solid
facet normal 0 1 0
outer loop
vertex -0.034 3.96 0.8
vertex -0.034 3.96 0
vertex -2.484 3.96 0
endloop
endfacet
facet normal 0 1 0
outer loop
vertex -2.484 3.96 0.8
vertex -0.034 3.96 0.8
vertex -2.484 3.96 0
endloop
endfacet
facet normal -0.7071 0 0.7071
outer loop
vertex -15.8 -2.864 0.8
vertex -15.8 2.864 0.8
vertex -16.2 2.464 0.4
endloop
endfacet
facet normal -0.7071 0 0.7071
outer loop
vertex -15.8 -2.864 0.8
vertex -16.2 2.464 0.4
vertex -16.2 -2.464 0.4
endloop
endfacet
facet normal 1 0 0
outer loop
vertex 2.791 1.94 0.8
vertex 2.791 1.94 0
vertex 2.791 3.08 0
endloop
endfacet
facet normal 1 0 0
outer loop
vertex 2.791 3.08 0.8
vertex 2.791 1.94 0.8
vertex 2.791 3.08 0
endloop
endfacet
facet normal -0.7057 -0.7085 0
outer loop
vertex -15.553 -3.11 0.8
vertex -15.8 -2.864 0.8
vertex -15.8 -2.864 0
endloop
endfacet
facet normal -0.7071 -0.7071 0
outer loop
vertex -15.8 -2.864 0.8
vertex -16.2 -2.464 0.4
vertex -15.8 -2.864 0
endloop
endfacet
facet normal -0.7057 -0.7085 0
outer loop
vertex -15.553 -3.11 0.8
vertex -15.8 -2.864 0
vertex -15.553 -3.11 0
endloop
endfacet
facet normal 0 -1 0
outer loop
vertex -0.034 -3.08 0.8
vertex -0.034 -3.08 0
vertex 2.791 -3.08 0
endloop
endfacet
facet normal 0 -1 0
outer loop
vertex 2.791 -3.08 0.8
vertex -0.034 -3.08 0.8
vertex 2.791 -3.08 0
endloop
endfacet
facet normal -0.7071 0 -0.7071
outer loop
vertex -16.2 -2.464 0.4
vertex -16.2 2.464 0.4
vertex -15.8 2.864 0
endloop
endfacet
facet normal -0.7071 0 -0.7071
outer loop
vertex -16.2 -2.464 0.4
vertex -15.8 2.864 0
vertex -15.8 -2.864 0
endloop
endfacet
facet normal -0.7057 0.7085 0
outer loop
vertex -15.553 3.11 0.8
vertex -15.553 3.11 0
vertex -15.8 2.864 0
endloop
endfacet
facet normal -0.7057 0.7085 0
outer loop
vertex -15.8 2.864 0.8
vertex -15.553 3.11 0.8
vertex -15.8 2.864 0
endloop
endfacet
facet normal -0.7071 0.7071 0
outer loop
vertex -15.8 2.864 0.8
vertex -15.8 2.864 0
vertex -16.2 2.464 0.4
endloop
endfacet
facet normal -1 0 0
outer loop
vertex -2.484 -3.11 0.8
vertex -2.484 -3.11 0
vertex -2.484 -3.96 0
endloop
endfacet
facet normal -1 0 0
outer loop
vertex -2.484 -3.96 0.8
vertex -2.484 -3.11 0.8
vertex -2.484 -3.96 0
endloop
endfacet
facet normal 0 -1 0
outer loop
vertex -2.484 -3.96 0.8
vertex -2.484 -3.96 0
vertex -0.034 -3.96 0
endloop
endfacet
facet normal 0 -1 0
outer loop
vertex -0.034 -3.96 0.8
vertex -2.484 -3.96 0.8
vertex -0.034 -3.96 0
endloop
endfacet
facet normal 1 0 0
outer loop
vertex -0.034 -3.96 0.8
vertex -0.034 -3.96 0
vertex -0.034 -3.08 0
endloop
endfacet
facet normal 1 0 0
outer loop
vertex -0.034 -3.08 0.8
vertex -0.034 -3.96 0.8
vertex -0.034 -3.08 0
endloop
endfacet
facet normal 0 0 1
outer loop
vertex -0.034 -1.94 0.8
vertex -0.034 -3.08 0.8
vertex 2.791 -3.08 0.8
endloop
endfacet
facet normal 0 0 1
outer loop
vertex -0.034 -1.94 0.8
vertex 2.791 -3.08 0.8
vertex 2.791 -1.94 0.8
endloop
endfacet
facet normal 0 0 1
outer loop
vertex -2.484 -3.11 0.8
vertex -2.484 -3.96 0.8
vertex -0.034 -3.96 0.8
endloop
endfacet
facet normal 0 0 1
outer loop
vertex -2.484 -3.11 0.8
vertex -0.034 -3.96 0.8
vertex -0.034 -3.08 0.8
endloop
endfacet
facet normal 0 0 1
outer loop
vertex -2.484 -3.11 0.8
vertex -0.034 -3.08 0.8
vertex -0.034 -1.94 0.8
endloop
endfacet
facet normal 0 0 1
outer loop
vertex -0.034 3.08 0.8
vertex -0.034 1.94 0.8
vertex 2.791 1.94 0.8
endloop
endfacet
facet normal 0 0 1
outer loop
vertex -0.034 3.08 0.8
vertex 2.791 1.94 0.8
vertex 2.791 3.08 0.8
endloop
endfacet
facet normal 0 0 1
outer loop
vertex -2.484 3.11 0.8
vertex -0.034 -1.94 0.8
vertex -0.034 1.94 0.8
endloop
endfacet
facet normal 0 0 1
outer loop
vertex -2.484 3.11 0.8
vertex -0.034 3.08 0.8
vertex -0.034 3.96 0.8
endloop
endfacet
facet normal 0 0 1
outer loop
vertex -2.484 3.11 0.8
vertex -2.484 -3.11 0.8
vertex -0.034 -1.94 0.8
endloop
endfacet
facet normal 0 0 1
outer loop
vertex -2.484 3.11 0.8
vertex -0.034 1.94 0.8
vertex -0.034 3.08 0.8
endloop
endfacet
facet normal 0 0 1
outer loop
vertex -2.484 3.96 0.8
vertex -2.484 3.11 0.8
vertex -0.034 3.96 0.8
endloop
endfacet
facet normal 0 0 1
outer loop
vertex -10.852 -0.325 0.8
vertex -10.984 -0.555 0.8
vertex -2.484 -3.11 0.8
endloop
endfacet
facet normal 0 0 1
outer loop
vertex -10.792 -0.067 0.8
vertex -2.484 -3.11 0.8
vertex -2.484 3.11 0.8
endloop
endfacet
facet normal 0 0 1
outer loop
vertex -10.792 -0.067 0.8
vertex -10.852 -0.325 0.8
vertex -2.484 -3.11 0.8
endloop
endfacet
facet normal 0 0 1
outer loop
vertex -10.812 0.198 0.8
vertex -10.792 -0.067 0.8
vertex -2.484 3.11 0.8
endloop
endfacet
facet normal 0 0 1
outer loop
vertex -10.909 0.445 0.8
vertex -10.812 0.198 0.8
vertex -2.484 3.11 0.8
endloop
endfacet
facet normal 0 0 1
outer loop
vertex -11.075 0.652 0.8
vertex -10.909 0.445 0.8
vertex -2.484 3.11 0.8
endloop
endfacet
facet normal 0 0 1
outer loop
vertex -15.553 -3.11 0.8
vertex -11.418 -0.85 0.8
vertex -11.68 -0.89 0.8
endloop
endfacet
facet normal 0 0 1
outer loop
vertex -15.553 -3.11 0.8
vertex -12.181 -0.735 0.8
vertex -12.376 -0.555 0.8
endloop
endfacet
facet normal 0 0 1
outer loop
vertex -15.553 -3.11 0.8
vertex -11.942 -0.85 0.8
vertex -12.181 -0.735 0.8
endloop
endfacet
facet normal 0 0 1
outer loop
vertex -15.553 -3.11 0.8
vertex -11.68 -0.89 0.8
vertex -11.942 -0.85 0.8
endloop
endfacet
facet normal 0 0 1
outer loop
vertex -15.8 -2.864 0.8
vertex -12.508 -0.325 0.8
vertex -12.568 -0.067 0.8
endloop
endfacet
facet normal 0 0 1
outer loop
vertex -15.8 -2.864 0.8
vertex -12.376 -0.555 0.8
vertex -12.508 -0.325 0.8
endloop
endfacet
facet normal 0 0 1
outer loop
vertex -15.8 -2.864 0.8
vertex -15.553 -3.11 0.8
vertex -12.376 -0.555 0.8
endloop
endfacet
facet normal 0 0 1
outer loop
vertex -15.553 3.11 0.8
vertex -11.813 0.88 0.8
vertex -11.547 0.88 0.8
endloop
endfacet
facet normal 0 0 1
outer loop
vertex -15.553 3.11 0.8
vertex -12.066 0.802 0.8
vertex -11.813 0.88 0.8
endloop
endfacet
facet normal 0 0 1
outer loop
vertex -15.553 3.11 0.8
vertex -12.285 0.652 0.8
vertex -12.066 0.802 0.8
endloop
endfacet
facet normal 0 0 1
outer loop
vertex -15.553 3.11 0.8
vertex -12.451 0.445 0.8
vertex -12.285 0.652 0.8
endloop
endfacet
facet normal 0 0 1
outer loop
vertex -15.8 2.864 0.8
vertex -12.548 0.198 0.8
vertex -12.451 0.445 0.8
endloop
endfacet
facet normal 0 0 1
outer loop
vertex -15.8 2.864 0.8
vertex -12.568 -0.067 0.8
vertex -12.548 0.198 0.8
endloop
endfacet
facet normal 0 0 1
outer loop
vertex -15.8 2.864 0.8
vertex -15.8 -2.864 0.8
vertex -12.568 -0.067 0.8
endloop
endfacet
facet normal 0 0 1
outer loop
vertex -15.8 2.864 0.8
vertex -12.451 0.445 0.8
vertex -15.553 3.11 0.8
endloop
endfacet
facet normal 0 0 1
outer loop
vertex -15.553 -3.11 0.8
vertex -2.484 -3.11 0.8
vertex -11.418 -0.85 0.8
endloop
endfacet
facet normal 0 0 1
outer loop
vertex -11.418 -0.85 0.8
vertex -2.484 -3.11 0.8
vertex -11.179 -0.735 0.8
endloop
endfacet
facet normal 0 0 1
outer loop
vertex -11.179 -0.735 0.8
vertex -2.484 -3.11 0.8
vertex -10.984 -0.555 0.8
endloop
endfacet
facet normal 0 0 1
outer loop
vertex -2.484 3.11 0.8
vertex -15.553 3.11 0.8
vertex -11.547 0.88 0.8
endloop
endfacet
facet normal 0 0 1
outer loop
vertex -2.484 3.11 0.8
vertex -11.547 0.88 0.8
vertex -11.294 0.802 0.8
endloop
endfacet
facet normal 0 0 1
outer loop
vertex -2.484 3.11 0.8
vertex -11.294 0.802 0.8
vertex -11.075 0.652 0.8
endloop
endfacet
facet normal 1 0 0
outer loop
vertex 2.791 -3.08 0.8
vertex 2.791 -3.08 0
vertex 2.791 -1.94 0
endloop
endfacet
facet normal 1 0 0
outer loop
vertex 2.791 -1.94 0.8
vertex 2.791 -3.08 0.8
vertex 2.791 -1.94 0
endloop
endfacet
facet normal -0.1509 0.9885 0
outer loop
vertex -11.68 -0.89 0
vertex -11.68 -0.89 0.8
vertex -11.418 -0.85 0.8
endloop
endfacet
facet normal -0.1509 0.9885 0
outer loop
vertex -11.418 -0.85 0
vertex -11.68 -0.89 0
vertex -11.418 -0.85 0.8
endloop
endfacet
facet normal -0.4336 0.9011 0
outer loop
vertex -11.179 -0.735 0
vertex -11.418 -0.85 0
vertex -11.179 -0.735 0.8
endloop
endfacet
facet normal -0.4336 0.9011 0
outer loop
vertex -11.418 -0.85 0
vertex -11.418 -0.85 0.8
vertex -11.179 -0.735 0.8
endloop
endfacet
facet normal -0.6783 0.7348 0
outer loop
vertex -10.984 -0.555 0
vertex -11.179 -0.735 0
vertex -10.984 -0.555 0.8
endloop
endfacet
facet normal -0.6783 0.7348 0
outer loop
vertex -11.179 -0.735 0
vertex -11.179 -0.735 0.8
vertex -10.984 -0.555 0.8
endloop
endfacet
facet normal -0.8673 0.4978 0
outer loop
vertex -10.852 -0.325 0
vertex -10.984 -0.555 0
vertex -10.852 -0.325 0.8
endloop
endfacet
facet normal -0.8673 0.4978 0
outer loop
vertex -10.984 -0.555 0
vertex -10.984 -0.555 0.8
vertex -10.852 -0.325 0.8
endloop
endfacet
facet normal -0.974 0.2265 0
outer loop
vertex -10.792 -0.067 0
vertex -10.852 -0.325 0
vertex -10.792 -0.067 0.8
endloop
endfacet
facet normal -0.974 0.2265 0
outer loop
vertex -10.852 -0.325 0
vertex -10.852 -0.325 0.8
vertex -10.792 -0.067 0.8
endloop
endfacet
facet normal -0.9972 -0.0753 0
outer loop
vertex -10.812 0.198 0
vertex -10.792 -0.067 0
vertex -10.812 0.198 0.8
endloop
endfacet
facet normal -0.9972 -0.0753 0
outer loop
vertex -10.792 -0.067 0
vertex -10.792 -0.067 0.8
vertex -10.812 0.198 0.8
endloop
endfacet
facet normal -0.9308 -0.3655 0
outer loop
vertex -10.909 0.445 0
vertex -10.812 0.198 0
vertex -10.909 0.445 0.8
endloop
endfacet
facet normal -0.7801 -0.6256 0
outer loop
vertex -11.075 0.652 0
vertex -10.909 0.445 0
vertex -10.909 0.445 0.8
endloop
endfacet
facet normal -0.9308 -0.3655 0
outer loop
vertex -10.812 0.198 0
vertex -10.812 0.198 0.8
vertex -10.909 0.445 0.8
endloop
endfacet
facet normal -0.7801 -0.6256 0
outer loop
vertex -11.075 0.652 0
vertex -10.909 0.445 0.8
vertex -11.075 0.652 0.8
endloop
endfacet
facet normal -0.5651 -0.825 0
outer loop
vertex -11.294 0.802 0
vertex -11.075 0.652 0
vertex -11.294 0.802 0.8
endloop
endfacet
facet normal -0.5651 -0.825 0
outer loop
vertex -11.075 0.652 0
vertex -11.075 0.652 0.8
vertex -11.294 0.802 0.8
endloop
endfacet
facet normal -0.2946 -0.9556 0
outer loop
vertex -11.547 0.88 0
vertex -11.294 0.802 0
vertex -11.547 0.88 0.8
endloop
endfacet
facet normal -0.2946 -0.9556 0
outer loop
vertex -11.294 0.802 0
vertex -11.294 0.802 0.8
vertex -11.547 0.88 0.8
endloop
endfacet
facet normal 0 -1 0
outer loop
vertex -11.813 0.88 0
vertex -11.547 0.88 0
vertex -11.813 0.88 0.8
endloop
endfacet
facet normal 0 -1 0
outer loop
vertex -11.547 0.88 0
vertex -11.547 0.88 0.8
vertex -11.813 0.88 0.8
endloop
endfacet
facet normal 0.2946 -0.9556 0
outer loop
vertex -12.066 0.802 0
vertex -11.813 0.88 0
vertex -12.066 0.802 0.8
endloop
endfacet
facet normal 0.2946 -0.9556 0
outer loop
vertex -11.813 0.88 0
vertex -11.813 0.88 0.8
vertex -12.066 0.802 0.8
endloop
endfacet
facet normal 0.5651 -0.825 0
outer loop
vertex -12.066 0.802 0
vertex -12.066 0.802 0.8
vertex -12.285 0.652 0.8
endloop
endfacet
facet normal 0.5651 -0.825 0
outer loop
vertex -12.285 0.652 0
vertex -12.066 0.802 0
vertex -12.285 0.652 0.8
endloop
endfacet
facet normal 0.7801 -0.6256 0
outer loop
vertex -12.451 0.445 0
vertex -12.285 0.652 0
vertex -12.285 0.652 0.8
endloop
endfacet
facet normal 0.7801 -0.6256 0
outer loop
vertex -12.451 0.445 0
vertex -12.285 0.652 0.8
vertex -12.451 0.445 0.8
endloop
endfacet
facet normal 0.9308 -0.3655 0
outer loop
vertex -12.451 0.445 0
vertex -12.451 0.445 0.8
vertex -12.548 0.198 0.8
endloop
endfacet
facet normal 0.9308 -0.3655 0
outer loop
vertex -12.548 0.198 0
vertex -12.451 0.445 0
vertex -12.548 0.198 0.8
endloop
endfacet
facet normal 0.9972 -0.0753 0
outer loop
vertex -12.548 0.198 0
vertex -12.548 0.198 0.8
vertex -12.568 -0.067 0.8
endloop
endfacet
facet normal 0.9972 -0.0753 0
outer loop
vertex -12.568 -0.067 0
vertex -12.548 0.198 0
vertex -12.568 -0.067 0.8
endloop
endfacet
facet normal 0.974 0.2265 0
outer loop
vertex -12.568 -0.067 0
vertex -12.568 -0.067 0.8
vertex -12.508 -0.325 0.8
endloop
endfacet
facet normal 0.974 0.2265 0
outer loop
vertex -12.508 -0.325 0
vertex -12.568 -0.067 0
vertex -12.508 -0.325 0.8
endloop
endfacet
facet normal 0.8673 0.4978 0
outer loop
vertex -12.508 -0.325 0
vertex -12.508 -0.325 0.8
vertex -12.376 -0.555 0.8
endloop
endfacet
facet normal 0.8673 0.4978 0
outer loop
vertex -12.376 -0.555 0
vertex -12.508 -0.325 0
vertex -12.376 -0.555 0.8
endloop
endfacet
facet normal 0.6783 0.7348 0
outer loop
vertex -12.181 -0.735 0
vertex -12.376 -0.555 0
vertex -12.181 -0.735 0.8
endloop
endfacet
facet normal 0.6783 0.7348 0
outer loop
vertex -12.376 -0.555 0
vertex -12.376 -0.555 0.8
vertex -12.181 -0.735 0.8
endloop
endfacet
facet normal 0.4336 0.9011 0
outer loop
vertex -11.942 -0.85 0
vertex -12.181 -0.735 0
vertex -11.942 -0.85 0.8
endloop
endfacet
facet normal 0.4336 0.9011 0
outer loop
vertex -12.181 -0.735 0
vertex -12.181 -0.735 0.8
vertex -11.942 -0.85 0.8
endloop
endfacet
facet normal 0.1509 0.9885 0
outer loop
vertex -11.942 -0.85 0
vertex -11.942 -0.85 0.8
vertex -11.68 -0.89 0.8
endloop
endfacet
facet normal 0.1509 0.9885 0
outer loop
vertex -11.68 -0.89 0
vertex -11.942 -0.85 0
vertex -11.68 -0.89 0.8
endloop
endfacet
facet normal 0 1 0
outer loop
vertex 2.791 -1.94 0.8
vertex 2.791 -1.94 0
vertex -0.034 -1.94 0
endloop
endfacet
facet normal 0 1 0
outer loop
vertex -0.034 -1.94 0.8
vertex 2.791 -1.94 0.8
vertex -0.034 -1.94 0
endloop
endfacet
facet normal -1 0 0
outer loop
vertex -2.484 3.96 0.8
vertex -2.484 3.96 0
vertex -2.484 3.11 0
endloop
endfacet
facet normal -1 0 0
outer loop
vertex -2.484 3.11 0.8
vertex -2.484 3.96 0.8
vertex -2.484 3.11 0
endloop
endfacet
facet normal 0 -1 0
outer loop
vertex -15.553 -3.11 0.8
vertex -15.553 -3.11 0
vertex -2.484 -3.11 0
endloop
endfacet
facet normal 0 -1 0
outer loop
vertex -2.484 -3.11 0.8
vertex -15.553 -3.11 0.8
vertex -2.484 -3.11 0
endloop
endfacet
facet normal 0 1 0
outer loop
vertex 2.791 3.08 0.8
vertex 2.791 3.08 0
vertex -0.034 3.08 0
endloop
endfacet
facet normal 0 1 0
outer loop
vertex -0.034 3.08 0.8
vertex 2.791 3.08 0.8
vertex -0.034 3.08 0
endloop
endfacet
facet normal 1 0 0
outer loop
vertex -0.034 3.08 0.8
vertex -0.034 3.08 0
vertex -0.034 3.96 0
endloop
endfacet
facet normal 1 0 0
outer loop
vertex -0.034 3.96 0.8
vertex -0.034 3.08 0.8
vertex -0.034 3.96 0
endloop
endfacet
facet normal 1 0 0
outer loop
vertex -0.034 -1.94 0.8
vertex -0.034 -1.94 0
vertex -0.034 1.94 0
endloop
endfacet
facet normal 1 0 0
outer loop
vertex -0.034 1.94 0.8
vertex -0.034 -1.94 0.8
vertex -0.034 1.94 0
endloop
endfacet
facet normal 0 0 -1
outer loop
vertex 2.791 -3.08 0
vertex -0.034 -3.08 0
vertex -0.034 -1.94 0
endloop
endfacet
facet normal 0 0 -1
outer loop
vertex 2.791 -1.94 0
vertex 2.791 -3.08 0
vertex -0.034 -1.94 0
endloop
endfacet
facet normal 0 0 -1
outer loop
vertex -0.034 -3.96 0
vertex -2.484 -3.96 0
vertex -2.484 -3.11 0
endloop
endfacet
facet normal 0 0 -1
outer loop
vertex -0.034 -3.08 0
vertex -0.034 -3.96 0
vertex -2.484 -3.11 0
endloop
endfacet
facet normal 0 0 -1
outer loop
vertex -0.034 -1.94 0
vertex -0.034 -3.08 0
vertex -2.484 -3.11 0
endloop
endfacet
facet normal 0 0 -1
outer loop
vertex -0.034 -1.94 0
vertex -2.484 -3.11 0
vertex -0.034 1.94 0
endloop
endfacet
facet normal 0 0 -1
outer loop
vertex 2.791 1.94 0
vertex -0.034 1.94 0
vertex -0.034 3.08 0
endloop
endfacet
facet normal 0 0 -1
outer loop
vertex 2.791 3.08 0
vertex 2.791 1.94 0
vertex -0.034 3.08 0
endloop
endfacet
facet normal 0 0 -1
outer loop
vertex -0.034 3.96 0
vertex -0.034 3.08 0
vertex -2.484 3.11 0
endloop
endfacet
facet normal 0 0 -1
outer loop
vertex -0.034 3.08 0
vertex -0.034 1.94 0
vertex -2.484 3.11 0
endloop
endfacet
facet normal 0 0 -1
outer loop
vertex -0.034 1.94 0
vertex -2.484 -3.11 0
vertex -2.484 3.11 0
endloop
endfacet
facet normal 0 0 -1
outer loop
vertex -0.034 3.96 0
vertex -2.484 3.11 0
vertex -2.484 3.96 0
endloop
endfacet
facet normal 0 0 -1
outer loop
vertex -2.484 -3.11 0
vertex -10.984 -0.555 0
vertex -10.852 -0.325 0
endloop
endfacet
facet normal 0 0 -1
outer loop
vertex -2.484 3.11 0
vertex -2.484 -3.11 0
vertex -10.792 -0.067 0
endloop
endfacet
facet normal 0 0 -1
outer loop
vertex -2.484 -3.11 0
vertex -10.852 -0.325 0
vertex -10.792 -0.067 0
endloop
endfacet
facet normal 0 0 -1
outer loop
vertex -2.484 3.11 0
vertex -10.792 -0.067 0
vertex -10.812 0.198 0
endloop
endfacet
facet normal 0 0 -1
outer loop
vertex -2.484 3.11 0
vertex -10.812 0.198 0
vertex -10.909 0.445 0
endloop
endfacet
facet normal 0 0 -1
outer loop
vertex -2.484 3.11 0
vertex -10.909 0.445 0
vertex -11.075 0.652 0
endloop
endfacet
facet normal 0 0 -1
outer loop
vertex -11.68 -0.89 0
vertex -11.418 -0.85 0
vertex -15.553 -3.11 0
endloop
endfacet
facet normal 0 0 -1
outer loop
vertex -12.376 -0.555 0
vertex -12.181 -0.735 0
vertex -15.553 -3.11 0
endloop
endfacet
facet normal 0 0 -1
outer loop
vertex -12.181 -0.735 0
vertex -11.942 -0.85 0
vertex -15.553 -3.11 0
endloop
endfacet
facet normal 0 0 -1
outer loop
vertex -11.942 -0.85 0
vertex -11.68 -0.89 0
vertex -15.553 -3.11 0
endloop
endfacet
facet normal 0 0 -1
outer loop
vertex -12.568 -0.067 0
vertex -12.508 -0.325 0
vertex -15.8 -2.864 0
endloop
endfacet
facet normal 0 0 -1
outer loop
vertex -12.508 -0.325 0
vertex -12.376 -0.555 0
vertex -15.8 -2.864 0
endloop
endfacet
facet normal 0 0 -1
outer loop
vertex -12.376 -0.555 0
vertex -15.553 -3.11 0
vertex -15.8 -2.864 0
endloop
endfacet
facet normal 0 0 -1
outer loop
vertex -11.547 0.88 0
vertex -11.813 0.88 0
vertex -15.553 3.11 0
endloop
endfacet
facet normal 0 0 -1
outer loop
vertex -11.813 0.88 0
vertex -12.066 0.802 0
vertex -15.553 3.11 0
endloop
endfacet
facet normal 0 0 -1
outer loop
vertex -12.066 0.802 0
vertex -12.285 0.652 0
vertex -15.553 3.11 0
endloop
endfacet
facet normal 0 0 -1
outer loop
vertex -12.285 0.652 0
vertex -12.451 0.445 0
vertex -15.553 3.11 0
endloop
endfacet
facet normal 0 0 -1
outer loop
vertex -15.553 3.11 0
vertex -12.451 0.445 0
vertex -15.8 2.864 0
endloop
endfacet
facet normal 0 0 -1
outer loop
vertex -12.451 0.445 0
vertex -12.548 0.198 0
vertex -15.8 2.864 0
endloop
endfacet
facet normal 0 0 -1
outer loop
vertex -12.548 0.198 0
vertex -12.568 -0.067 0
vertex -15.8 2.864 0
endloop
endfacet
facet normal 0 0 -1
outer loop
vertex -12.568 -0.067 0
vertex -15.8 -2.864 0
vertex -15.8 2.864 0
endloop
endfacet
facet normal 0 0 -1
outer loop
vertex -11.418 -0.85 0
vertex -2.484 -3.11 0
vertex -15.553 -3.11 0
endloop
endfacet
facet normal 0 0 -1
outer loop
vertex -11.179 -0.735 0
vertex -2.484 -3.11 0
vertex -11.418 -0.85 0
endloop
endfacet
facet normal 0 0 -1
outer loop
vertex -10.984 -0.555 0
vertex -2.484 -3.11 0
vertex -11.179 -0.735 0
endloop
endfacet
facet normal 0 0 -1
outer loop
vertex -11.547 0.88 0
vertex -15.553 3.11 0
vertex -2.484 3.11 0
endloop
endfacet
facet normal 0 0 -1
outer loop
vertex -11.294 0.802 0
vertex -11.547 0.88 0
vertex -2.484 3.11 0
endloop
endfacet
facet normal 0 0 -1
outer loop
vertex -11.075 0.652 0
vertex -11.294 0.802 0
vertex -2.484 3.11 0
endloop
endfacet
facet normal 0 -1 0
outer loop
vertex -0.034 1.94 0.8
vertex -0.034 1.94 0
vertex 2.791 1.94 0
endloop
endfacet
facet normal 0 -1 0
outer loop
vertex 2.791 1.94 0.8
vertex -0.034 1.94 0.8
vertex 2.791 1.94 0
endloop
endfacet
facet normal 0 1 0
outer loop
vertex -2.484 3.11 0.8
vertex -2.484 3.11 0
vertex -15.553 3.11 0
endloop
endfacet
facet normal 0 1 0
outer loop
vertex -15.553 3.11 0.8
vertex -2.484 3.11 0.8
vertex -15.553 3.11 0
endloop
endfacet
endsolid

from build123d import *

# Parameters (mm, degrees)
EXTRUSION1_DEPTH        = 0.8
ESQUISSE2_R             = 0.89
ENL_V_MAT_EXTRU_1_DEPTH = 0.8
CHANFREIN1_SIZE         = 0.4
CHANFREIN2_SIZE         = 0.4


with BuildPart() as part:
    # Esquisse1 → Extrusion1 (new body)
    with BuildSketch(Plane(origin=(0, 0, 0), x_dir=(0, 1, 0), z_dir=(0, 0, 1))):
        Polygon((-3.96, 0.034), (-3.08, 0.034), (-3.08, -2.791082591), (-1.94, -2.791082591), (-1.94, 0.034), (1.94, 0.034), (1.94, -2.791082591), (3.08, -2.791082591), (3.08, 0.034), (3.96, 0.034), (3.96, 2.484), (3.11, 2.484), (3.11, 15.553159959), (2.464351087, 16.2), (-2.464351087, 16.2), (-3.11, 15.553159959), (-3.11, 2.484), (-3.96, 2.484), align=None)
    extrude(amount=EXTRUSION1_DEPTH)

    # Esquisse2 → Enlèv. mat.-Extru.1 (cut)
    with BuildSketch(Plane(origin=(0, 0, 0.8), x_dir=(0, 1, 0), z_dir=(0, 0, 1))):
        with Locations(Location((0, 11.68, 0), (0, 0, 180))):
            Circle(ESQUISSE2_R)
    extrude(amount=-ENL_V_MAT_EXTRU_1_DEPTH, mode=Mode.SUBTRACT)

    # Chanfrein1
    chanfrein1_edges = [part.edges().sort_by_distance(p)[0] for p in [
        (-16.2, 0, 0),
    ]]
    chamfer(chanfrein1_edges, length=CHANFREIN1_SIZE)

    # Chanfrein2
    chanfrein2_edges = [part.edges().sort_by_distance(p)[0] for p in [
        (-16.2, 0, 0.8),
    ]]
    chamfer(chanfrein2_edges, length=CHANFREIN2_SIZE - 0.0001)  # a hair under: the kernel refuses the full size


solid = part.part
